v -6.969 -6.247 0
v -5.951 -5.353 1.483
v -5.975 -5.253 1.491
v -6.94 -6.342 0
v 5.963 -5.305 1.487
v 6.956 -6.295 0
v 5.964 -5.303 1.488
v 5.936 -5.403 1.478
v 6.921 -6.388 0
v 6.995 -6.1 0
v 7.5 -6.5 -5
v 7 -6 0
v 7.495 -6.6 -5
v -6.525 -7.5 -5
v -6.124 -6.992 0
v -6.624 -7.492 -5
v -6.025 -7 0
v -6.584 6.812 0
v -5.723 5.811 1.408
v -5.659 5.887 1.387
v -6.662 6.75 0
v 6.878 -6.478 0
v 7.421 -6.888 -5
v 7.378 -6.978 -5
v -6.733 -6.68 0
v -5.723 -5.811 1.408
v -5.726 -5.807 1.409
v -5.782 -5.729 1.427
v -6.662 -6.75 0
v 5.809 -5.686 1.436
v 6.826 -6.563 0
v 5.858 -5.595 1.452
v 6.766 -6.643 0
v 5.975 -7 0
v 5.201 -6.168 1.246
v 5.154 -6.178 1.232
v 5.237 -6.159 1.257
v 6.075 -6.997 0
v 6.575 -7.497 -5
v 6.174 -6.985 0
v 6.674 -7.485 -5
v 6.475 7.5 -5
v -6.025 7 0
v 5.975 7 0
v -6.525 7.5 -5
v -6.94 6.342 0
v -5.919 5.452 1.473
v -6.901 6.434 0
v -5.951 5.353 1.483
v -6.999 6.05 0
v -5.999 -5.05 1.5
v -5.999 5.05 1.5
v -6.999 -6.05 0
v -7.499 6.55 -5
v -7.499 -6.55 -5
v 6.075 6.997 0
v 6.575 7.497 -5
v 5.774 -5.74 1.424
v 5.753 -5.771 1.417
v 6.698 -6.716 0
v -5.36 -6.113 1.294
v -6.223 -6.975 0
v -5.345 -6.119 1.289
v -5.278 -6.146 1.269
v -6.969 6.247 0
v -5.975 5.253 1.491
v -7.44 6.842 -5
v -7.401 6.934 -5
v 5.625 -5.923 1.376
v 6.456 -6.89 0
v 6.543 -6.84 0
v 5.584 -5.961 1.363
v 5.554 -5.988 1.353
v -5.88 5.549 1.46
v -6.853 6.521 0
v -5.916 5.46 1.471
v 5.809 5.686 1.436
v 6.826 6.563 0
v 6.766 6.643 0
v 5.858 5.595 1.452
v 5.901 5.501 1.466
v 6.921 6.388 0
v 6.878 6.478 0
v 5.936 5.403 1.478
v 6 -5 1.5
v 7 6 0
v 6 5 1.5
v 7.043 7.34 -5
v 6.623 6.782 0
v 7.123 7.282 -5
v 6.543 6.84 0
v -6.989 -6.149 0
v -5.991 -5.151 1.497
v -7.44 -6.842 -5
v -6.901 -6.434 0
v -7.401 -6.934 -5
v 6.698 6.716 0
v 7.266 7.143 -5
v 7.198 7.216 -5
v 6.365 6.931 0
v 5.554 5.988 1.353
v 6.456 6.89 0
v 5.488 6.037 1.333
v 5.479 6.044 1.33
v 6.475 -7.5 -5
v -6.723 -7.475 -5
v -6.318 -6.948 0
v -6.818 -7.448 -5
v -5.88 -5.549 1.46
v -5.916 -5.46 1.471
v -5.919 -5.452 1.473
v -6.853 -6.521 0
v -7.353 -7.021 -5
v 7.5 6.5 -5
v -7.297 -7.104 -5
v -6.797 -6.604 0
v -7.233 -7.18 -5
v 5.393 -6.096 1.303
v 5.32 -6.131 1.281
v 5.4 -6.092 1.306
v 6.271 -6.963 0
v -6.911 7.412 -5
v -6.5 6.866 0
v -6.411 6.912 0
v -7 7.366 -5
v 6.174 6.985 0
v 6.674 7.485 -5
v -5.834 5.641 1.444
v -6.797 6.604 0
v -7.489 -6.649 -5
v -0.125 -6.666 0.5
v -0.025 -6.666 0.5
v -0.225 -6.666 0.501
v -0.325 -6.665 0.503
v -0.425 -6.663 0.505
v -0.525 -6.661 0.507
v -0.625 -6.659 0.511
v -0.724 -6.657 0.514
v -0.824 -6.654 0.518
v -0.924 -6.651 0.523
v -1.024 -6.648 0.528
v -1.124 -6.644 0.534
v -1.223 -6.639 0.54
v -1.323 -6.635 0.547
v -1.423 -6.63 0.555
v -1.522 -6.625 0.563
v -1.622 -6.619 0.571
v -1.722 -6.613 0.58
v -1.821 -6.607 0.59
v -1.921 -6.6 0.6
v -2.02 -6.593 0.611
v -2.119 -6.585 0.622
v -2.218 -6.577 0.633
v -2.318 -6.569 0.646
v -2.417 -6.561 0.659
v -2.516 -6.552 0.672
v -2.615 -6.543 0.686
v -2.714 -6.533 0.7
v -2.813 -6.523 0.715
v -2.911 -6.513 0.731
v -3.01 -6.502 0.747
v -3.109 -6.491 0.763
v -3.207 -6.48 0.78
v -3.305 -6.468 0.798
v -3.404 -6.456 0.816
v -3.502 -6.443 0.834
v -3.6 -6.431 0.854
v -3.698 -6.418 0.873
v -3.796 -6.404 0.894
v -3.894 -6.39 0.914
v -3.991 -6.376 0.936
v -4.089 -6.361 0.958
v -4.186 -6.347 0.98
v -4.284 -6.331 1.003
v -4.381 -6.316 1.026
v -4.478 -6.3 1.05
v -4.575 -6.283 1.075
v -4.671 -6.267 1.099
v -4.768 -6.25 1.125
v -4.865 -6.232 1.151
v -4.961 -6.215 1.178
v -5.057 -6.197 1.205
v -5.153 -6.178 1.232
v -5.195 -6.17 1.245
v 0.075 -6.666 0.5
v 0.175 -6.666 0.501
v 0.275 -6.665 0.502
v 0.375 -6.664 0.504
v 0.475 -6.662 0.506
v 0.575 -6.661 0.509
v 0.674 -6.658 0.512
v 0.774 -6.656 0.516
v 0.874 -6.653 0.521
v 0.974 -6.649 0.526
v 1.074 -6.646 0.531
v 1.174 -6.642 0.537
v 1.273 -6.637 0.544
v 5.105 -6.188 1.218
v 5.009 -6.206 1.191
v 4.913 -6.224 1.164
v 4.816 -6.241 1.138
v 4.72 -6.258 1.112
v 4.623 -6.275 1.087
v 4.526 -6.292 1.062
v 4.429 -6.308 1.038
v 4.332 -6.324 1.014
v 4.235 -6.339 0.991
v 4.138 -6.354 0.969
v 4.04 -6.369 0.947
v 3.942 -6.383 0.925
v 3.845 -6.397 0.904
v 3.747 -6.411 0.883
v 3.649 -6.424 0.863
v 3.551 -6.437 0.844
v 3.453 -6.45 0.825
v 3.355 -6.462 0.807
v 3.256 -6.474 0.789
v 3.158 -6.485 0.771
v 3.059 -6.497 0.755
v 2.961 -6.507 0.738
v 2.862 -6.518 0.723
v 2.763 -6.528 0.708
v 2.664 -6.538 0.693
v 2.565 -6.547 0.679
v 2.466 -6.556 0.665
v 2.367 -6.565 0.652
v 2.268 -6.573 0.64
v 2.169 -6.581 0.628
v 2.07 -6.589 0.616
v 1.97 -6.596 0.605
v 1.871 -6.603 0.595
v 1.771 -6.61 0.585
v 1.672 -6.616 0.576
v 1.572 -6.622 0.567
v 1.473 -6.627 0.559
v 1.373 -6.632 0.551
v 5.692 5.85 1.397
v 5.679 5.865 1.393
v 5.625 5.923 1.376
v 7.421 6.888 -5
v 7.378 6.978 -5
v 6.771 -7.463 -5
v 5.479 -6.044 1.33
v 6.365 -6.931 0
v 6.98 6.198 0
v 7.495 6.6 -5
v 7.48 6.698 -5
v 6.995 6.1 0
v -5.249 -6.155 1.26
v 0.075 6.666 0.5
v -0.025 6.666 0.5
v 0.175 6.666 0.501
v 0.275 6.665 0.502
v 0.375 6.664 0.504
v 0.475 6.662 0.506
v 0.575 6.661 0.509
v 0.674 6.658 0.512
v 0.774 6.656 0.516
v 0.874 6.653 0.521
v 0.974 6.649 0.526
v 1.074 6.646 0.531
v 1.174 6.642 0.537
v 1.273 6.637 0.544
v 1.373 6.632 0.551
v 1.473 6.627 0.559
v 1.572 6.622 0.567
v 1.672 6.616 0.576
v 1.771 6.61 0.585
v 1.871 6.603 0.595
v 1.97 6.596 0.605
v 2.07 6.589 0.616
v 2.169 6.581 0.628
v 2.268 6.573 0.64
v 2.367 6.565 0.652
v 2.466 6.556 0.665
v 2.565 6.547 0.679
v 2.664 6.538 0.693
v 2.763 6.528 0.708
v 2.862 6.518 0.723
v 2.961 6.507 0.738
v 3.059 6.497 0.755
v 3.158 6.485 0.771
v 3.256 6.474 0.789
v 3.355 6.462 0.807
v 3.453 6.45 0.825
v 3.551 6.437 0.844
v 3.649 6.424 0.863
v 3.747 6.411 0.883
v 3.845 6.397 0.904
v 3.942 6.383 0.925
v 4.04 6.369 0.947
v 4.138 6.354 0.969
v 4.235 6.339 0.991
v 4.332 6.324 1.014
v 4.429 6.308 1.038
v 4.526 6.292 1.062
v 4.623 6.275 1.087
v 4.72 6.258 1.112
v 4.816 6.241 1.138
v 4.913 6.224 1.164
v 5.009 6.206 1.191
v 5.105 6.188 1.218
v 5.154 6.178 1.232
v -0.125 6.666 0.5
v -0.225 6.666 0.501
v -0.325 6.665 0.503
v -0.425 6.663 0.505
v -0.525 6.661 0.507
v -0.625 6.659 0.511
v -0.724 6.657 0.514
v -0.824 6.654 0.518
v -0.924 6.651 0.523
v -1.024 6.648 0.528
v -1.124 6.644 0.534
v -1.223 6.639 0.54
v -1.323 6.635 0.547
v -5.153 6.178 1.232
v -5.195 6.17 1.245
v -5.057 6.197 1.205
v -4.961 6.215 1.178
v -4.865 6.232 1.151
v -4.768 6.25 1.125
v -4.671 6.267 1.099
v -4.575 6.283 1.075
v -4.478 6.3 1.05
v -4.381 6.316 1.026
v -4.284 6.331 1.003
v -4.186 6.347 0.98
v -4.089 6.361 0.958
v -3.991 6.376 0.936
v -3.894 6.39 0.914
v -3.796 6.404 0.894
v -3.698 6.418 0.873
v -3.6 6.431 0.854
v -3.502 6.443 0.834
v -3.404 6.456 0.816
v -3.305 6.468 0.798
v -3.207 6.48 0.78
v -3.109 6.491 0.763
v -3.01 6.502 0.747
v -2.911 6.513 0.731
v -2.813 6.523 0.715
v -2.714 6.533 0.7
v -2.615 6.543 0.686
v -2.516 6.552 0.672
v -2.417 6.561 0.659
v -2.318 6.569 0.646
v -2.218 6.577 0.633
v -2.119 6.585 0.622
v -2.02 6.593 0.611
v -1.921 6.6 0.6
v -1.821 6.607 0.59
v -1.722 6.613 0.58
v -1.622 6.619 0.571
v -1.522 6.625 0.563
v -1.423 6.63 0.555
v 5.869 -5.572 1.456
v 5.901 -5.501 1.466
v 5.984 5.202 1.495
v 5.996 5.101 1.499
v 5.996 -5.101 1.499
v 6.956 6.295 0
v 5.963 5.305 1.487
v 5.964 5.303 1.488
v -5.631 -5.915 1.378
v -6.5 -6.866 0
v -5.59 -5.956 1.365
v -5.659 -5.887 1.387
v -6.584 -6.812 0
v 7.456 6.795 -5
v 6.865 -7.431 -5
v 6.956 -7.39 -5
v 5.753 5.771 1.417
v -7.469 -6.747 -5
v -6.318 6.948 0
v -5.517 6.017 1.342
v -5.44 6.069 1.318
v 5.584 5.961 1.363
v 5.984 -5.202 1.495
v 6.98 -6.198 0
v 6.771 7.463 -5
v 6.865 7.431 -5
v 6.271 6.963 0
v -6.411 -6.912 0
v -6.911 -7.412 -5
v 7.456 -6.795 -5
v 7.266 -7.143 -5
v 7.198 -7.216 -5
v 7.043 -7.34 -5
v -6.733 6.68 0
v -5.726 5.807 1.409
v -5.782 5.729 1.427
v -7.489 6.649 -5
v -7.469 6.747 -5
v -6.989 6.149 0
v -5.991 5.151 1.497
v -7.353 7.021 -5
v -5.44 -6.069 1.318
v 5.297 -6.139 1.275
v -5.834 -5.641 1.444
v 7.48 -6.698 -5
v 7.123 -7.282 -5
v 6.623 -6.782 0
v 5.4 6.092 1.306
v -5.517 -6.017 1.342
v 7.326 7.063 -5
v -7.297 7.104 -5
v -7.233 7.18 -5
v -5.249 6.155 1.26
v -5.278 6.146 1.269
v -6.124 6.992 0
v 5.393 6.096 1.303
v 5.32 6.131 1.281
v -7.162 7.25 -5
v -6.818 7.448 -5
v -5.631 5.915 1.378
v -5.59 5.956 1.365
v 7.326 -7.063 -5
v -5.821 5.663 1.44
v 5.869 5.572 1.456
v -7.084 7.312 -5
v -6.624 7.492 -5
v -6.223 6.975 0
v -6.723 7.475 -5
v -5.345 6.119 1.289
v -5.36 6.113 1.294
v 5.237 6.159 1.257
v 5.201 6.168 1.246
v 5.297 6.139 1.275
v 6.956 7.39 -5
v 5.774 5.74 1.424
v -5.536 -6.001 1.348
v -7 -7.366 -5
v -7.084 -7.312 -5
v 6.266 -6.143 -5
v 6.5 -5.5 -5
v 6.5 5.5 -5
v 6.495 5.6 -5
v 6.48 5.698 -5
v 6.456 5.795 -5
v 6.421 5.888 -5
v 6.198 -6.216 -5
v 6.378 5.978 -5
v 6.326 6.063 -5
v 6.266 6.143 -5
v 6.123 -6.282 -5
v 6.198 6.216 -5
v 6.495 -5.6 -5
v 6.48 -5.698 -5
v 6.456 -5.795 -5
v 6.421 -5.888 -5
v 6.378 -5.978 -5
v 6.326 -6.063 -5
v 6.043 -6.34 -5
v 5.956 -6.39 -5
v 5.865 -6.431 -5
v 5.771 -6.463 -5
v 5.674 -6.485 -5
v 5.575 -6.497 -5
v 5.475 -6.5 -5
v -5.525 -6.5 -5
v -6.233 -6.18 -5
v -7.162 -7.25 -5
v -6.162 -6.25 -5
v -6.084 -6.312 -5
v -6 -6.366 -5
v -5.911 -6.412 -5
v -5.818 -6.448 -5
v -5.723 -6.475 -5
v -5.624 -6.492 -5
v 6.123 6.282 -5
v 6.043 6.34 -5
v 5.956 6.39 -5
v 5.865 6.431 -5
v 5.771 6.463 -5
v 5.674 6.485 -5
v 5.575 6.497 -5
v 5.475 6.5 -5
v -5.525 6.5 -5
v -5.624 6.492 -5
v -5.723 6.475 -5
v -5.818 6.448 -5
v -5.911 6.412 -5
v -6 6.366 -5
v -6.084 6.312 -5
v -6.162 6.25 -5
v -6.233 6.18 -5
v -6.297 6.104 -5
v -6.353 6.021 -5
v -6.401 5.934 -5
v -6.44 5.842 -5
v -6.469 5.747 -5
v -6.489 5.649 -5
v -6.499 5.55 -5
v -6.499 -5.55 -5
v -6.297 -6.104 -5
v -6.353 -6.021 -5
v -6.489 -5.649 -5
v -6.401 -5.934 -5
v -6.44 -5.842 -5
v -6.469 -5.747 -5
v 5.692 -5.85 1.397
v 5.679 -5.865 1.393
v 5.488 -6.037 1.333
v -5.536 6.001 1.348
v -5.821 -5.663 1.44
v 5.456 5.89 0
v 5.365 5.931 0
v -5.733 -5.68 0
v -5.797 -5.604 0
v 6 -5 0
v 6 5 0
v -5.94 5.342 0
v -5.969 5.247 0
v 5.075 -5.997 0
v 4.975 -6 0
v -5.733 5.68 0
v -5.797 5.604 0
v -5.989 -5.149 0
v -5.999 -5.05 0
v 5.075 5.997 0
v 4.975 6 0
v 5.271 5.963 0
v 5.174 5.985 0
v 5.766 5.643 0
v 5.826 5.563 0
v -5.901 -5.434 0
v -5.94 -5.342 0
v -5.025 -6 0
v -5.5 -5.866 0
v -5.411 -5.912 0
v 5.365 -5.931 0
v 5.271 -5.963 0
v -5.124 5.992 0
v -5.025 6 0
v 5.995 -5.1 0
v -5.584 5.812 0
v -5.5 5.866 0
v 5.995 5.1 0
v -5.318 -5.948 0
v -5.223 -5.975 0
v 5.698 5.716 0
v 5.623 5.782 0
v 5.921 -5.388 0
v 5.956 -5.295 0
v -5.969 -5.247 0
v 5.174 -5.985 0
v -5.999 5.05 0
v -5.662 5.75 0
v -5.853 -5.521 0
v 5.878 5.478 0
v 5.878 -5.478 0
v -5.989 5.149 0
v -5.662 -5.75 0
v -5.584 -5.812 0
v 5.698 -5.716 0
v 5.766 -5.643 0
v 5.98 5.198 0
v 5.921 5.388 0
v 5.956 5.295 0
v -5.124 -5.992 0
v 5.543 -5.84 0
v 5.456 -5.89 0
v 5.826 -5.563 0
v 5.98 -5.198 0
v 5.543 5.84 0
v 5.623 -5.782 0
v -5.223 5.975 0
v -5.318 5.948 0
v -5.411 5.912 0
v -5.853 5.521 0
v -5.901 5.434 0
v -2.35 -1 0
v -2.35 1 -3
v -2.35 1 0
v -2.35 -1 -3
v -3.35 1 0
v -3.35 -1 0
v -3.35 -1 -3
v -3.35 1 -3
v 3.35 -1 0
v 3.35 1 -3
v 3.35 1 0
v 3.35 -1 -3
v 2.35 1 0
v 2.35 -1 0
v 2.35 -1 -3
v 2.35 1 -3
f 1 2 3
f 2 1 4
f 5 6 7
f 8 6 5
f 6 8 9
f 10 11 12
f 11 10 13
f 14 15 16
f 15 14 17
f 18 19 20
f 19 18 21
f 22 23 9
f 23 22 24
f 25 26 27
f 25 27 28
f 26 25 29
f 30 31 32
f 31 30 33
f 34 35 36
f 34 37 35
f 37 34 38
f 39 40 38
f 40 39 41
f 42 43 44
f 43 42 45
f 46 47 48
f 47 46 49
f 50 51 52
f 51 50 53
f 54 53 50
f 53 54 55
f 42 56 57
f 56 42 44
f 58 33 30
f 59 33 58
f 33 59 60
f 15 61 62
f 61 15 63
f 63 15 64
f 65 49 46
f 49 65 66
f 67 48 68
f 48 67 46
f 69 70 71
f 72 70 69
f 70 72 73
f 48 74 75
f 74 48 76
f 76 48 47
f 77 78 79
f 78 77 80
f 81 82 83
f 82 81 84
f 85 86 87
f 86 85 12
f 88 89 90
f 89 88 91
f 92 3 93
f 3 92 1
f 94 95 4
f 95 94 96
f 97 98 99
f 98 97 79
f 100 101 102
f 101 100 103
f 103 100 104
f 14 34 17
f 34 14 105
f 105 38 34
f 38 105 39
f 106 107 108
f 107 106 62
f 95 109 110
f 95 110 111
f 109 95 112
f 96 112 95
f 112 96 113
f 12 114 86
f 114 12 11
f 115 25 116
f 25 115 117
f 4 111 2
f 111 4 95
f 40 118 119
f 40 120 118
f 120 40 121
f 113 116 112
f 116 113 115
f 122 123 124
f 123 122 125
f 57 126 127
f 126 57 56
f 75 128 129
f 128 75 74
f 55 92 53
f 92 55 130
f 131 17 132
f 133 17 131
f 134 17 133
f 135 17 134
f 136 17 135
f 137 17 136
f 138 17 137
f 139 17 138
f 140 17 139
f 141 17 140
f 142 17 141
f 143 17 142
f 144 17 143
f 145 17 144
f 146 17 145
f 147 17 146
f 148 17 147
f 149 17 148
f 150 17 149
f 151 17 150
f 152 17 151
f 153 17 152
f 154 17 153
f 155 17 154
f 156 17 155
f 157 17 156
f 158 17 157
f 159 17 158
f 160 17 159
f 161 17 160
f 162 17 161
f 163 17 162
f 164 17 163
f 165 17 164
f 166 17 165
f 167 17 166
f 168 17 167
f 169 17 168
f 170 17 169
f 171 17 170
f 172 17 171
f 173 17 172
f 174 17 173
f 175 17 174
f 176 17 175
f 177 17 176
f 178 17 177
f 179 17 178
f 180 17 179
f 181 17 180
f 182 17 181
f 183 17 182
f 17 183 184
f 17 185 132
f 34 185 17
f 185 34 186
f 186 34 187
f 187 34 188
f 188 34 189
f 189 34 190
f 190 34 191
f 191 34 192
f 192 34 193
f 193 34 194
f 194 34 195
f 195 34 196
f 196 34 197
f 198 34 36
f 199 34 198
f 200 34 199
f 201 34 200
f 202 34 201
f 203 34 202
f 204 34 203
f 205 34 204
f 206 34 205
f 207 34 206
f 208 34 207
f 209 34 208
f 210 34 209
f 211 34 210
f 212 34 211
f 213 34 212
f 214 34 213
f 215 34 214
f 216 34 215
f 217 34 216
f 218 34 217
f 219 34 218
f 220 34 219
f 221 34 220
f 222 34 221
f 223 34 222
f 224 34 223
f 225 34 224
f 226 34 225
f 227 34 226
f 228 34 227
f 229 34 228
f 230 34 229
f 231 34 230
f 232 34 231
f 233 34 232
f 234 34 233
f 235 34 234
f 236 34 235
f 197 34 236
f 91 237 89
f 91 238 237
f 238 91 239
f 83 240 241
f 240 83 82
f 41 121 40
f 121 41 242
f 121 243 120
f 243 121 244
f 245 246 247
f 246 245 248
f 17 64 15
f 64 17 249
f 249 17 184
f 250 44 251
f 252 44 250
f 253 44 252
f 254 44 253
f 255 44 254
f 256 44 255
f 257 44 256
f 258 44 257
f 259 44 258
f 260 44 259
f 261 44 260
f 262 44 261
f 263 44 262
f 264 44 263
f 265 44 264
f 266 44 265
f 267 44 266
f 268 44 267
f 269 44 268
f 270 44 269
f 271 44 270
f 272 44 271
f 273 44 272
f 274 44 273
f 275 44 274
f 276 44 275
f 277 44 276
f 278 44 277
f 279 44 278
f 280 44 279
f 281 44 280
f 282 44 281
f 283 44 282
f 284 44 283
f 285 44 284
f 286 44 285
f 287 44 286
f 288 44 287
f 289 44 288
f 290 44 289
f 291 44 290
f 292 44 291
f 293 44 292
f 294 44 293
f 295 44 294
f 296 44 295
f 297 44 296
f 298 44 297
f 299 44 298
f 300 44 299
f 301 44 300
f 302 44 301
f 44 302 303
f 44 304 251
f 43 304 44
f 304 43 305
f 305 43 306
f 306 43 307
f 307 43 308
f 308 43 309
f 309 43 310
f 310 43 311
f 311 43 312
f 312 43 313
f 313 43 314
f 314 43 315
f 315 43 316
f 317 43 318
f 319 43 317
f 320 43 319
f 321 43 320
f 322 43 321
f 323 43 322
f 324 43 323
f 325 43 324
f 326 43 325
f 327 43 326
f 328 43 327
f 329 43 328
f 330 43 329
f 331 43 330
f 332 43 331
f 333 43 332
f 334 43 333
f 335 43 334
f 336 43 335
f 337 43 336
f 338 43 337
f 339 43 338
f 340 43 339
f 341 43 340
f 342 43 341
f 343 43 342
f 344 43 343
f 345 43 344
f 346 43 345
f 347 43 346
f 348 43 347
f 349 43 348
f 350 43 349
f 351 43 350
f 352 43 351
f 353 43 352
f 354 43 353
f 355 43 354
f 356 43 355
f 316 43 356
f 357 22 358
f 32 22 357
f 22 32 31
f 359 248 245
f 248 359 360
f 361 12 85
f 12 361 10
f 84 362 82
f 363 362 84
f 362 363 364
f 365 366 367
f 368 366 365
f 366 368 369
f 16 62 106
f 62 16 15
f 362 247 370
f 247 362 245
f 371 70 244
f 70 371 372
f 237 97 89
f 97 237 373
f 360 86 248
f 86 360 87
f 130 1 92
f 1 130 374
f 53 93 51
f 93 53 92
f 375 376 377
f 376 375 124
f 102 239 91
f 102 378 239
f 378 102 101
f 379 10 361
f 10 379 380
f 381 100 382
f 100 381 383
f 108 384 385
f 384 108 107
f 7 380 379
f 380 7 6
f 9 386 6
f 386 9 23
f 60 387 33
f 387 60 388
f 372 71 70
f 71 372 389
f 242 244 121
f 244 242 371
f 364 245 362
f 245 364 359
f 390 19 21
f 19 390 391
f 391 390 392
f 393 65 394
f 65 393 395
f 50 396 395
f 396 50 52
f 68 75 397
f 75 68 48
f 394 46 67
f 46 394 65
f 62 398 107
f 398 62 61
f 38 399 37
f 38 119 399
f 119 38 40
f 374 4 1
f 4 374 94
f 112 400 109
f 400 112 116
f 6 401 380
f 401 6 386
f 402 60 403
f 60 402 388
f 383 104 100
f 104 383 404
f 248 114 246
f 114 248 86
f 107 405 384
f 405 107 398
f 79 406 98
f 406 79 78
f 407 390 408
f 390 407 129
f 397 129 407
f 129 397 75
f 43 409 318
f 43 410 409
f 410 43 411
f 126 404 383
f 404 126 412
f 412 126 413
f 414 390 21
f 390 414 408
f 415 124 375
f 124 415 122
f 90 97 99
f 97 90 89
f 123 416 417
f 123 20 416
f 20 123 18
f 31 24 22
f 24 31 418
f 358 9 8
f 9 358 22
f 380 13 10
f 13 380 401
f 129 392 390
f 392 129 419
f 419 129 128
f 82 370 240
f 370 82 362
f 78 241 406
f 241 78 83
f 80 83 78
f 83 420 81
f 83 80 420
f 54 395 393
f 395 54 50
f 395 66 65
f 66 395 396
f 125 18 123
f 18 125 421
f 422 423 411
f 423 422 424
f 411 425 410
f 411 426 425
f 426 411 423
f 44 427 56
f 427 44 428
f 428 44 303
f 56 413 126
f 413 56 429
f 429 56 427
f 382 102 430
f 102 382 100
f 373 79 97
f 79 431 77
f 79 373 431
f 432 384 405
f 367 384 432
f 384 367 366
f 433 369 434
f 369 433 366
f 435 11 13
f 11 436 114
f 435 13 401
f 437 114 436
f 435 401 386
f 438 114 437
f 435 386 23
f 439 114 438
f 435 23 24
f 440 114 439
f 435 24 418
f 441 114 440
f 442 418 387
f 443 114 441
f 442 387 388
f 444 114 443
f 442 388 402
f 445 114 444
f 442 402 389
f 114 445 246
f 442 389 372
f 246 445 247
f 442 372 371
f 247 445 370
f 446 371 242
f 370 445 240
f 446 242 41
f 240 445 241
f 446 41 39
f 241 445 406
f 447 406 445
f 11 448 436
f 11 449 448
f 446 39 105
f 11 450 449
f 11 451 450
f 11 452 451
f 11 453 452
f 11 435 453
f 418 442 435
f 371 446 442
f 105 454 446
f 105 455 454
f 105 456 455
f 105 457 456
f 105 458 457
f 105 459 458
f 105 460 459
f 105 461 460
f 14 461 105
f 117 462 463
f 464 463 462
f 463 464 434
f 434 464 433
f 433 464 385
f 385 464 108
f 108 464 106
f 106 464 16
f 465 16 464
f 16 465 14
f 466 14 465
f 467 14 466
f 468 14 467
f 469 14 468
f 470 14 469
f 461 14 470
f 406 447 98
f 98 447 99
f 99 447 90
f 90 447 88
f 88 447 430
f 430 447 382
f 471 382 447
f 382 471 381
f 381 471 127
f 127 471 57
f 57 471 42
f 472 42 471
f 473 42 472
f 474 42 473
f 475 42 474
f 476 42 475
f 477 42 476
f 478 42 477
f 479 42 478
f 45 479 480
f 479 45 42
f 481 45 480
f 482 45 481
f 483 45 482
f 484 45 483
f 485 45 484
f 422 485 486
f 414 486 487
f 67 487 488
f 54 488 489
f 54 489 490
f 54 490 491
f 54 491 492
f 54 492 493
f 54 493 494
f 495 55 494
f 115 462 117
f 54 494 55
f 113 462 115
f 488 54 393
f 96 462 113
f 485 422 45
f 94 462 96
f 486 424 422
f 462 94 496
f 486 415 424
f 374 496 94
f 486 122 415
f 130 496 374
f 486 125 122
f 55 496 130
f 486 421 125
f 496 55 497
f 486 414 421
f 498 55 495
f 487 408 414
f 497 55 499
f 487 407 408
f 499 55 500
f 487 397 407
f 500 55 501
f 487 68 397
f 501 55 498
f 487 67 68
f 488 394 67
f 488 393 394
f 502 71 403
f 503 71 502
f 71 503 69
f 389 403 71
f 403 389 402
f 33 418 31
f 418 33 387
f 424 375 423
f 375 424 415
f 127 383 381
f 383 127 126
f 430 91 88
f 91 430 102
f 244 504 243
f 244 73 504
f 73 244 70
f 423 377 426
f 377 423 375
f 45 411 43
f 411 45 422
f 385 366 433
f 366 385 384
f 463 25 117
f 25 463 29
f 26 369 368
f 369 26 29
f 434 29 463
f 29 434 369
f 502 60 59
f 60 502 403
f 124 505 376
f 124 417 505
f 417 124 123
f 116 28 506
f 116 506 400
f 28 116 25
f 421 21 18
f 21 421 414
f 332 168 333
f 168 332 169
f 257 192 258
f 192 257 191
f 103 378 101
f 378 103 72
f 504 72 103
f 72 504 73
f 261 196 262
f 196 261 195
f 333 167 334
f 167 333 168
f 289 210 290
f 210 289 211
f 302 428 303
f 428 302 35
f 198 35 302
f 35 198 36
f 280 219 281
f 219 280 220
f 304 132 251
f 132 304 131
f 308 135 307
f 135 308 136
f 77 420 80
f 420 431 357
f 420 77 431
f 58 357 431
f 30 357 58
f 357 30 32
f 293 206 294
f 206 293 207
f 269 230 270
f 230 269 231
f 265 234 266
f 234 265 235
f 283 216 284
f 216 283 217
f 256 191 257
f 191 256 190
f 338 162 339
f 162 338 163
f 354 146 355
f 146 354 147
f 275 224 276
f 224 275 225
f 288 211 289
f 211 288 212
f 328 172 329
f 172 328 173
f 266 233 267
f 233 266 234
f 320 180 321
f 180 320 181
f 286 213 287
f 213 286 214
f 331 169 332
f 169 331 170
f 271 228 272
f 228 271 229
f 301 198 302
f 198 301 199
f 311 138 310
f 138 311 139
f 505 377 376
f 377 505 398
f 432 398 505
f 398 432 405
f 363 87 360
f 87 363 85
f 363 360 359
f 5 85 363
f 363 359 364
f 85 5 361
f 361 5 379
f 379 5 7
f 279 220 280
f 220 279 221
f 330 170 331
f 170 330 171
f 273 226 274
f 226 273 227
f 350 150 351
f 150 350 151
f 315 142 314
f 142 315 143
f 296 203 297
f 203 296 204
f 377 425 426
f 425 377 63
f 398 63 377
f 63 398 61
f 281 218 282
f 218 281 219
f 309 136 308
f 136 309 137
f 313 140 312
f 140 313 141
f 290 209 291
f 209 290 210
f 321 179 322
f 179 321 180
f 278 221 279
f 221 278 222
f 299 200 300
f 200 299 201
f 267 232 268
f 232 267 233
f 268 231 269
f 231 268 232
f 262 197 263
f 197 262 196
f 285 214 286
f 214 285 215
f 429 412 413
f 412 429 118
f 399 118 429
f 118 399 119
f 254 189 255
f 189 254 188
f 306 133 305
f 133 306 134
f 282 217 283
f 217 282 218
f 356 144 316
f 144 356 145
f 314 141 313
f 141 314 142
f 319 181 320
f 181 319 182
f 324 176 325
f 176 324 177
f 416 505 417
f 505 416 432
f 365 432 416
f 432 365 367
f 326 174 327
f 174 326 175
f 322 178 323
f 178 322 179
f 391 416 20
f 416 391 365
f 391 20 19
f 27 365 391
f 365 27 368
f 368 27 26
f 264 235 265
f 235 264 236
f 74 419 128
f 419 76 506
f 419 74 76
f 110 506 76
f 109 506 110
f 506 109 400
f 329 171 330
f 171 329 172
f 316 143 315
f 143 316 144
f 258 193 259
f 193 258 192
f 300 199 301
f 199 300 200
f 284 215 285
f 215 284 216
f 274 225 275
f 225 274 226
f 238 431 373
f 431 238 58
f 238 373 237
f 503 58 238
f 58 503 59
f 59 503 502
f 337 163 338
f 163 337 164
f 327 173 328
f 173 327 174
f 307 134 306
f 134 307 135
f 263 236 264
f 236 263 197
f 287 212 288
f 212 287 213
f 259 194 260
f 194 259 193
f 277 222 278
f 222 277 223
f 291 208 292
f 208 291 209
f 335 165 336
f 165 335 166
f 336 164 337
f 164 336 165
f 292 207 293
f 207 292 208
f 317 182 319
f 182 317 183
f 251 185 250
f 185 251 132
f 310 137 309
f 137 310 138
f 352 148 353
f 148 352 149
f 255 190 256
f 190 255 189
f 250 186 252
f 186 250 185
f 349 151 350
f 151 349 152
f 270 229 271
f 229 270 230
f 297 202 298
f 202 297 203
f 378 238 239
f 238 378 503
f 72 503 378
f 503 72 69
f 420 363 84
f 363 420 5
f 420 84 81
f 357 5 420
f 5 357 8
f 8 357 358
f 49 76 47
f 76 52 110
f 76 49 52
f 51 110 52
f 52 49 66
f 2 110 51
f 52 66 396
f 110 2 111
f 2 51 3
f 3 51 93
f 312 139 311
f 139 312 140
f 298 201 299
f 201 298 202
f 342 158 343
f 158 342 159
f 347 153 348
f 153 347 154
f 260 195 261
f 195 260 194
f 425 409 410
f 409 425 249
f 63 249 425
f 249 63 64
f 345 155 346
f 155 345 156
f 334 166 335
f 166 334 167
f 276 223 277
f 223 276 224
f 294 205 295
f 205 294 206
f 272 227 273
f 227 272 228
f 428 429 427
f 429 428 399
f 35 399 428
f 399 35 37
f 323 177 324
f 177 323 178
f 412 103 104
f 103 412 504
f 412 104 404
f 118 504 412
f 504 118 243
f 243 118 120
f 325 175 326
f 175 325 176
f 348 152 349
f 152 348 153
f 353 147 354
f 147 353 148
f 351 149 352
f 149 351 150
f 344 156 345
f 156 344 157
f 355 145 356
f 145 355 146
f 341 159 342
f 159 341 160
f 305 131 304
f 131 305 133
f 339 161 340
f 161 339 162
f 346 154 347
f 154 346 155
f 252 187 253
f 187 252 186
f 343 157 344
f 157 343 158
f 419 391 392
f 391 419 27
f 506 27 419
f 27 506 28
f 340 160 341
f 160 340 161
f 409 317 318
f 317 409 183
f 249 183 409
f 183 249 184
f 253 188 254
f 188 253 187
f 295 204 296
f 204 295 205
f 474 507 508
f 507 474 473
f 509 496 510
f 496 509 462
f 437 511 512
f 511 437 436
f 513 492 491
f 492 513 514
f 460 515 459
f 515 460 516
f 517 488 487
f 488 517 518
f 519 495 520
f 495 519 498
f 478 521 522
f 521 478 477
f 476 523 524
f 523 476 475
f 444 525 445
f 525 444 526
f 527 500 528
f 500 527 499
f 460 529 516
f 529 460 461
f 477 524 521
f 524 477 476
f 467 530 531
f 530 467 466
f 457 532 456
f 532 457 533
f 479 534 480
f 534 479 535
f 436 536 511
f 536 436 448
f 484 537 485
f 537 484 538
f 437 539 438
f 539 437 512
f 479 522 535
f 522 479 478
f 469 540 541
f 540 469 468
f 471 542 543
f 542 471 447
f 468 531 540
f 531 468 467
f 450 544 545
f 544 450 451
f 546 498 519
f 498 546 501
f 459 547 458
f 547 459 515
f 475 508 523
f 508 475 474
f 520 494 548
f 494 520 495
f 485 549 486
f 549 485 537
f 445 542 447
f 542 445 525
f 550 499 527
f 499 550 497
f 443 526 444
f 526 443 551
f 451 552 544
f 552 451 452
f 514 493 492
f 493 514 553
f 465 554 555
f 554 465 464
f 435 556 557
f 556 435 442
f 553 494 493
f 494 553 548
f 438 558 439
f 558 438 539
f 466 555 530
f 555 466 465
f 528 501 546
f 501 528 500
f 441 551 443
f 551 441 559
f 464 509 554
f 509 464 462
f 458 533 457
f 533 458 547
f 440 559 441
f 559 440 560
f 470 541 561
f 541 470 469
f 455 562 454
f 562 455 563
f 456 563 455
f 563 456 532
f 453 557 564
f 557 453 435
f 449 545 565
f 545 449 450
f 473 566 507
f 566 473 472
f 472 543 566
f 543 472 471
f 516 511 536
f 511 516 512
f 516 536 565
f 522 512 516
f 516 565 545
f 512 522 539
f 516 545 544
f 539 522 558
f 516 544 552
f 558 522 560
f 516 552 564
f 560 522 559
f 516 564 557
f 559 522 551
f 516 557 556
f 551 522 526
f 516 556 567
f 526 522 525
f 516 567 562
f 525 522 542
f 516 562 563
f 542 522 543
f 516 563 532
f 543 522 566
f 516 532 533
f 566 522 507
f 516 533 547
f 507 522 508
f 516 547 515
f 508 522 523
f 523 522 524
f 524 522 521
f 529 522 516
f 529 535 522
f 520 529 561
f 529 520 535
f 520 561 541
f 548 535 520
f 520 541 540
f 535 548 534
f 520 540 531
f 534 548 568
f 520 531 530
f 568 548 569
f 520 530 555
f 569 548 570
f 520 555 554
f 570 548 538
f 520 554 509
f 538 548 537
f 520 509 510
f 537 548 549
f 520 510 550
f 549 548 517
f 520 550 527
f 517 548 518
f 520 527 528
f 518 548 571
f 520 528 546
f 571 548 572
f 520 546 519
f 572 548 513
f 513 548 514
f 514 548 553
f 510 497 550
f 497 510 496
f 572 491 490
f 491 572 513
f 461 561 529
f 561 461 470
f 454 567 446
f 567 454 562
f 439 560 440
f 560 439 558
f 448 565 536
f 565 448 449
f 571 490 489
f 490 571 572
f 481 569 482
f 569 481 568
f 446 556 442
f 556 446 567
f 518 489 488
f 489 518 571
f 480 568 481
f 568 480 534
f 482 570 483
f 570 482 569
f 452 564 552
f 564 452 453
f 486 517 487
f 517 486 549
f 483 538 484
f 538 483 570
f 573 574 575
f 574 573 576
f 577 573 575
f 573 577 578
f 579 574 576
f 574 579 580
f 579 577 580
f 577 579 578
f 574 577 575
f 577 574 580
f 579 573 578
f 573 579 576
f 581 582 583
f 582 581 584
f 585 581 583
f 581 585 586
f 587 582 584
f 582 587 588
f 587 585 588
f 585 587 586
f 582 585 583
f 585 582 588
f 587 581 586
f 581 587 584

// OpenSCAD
$fs = 0.1;
$fa = 0.25;

// 角丸のプレート
module rounded_plate(x, y, r) {
  thickness = 0.0001;
  minkowski () {
    cube([x-r*2, y-r*2, thickness], center = true);
    cylinder(r = r, h = thickness);
  }
}

// キーキャップの外観を定義
module keycap1_outer_shape(bottom_size, middle_size, top_size, top_height, skert_height) {
  hull () {
    translate([0, 0, top_height])
    rounded_plate(top_size, top_size, 1);
    
    translate([0, 0, 0])
    rounded_plate(middle_size, middle_size, 1);
    
    translate([0, 0, -skert_height])
    rounded_plate(bottom_size, bottom_size, 1);
  }
}

module head_depress(top_size, top_height, depth) {
  // https://qiita.com/zk_phi/items/ab99315ebaef66e84aa0
  function dish_r(w, d) = (w * w + 4 * d * d) / (8 * d);
  
  hull() {
    angle = 0;
    translate([0, 0, top_height]);
    rotate([- angle, 0, 0])
    translate([0, 0, dish_r(top_size, depth) - depth+top_height])
    rotate([90, 0, 0])
    cylinder(r = dish_r(top_size, depth), h = 60, /* 適当に十分な長さ */ center = true);
  }
}

module keycap_shape () {
  thickness = 1.0;
  
  bottom_size = 15;
  middle_size = 14;
  top_height = 1.5;
  top_size = 12;
  top_depth = 1.0;
  skert_height = 5.0; 

  
  difference () {
    // 外形
    keycap1_outer_shape(bottom_size, middle_size, top_size, top_height, skert_height);
    
    // 上部の凹み
    head_depress(top_size, 1.5, 1);

    // くり抜くための外形
    keycap1_outer_shape(bottom_size - thickness * 2, middle_size - thickness * 2, top_size - thickness * 2, 0, skert_height);
  }
}

module kailh_choc_v1_stem() {
    translate([-2.85, 0, -3/2])
    cube([1, 2, 3], center=true);
    translate([2.85, 0, -3/2])
    cube([1, 2, 3], center=true);
}

union() {
  keycap_shape();
  kailh_choc_v1_stem();
}

// https://qiita.com/zk_phi/items/ab99315ebaef66e84aa0
// https://bebebe.hatenablog.jp/entry/2019/06/04/232501
// https://qiita.com/zk_phi/items/ab99315ebaef66e84aa0
